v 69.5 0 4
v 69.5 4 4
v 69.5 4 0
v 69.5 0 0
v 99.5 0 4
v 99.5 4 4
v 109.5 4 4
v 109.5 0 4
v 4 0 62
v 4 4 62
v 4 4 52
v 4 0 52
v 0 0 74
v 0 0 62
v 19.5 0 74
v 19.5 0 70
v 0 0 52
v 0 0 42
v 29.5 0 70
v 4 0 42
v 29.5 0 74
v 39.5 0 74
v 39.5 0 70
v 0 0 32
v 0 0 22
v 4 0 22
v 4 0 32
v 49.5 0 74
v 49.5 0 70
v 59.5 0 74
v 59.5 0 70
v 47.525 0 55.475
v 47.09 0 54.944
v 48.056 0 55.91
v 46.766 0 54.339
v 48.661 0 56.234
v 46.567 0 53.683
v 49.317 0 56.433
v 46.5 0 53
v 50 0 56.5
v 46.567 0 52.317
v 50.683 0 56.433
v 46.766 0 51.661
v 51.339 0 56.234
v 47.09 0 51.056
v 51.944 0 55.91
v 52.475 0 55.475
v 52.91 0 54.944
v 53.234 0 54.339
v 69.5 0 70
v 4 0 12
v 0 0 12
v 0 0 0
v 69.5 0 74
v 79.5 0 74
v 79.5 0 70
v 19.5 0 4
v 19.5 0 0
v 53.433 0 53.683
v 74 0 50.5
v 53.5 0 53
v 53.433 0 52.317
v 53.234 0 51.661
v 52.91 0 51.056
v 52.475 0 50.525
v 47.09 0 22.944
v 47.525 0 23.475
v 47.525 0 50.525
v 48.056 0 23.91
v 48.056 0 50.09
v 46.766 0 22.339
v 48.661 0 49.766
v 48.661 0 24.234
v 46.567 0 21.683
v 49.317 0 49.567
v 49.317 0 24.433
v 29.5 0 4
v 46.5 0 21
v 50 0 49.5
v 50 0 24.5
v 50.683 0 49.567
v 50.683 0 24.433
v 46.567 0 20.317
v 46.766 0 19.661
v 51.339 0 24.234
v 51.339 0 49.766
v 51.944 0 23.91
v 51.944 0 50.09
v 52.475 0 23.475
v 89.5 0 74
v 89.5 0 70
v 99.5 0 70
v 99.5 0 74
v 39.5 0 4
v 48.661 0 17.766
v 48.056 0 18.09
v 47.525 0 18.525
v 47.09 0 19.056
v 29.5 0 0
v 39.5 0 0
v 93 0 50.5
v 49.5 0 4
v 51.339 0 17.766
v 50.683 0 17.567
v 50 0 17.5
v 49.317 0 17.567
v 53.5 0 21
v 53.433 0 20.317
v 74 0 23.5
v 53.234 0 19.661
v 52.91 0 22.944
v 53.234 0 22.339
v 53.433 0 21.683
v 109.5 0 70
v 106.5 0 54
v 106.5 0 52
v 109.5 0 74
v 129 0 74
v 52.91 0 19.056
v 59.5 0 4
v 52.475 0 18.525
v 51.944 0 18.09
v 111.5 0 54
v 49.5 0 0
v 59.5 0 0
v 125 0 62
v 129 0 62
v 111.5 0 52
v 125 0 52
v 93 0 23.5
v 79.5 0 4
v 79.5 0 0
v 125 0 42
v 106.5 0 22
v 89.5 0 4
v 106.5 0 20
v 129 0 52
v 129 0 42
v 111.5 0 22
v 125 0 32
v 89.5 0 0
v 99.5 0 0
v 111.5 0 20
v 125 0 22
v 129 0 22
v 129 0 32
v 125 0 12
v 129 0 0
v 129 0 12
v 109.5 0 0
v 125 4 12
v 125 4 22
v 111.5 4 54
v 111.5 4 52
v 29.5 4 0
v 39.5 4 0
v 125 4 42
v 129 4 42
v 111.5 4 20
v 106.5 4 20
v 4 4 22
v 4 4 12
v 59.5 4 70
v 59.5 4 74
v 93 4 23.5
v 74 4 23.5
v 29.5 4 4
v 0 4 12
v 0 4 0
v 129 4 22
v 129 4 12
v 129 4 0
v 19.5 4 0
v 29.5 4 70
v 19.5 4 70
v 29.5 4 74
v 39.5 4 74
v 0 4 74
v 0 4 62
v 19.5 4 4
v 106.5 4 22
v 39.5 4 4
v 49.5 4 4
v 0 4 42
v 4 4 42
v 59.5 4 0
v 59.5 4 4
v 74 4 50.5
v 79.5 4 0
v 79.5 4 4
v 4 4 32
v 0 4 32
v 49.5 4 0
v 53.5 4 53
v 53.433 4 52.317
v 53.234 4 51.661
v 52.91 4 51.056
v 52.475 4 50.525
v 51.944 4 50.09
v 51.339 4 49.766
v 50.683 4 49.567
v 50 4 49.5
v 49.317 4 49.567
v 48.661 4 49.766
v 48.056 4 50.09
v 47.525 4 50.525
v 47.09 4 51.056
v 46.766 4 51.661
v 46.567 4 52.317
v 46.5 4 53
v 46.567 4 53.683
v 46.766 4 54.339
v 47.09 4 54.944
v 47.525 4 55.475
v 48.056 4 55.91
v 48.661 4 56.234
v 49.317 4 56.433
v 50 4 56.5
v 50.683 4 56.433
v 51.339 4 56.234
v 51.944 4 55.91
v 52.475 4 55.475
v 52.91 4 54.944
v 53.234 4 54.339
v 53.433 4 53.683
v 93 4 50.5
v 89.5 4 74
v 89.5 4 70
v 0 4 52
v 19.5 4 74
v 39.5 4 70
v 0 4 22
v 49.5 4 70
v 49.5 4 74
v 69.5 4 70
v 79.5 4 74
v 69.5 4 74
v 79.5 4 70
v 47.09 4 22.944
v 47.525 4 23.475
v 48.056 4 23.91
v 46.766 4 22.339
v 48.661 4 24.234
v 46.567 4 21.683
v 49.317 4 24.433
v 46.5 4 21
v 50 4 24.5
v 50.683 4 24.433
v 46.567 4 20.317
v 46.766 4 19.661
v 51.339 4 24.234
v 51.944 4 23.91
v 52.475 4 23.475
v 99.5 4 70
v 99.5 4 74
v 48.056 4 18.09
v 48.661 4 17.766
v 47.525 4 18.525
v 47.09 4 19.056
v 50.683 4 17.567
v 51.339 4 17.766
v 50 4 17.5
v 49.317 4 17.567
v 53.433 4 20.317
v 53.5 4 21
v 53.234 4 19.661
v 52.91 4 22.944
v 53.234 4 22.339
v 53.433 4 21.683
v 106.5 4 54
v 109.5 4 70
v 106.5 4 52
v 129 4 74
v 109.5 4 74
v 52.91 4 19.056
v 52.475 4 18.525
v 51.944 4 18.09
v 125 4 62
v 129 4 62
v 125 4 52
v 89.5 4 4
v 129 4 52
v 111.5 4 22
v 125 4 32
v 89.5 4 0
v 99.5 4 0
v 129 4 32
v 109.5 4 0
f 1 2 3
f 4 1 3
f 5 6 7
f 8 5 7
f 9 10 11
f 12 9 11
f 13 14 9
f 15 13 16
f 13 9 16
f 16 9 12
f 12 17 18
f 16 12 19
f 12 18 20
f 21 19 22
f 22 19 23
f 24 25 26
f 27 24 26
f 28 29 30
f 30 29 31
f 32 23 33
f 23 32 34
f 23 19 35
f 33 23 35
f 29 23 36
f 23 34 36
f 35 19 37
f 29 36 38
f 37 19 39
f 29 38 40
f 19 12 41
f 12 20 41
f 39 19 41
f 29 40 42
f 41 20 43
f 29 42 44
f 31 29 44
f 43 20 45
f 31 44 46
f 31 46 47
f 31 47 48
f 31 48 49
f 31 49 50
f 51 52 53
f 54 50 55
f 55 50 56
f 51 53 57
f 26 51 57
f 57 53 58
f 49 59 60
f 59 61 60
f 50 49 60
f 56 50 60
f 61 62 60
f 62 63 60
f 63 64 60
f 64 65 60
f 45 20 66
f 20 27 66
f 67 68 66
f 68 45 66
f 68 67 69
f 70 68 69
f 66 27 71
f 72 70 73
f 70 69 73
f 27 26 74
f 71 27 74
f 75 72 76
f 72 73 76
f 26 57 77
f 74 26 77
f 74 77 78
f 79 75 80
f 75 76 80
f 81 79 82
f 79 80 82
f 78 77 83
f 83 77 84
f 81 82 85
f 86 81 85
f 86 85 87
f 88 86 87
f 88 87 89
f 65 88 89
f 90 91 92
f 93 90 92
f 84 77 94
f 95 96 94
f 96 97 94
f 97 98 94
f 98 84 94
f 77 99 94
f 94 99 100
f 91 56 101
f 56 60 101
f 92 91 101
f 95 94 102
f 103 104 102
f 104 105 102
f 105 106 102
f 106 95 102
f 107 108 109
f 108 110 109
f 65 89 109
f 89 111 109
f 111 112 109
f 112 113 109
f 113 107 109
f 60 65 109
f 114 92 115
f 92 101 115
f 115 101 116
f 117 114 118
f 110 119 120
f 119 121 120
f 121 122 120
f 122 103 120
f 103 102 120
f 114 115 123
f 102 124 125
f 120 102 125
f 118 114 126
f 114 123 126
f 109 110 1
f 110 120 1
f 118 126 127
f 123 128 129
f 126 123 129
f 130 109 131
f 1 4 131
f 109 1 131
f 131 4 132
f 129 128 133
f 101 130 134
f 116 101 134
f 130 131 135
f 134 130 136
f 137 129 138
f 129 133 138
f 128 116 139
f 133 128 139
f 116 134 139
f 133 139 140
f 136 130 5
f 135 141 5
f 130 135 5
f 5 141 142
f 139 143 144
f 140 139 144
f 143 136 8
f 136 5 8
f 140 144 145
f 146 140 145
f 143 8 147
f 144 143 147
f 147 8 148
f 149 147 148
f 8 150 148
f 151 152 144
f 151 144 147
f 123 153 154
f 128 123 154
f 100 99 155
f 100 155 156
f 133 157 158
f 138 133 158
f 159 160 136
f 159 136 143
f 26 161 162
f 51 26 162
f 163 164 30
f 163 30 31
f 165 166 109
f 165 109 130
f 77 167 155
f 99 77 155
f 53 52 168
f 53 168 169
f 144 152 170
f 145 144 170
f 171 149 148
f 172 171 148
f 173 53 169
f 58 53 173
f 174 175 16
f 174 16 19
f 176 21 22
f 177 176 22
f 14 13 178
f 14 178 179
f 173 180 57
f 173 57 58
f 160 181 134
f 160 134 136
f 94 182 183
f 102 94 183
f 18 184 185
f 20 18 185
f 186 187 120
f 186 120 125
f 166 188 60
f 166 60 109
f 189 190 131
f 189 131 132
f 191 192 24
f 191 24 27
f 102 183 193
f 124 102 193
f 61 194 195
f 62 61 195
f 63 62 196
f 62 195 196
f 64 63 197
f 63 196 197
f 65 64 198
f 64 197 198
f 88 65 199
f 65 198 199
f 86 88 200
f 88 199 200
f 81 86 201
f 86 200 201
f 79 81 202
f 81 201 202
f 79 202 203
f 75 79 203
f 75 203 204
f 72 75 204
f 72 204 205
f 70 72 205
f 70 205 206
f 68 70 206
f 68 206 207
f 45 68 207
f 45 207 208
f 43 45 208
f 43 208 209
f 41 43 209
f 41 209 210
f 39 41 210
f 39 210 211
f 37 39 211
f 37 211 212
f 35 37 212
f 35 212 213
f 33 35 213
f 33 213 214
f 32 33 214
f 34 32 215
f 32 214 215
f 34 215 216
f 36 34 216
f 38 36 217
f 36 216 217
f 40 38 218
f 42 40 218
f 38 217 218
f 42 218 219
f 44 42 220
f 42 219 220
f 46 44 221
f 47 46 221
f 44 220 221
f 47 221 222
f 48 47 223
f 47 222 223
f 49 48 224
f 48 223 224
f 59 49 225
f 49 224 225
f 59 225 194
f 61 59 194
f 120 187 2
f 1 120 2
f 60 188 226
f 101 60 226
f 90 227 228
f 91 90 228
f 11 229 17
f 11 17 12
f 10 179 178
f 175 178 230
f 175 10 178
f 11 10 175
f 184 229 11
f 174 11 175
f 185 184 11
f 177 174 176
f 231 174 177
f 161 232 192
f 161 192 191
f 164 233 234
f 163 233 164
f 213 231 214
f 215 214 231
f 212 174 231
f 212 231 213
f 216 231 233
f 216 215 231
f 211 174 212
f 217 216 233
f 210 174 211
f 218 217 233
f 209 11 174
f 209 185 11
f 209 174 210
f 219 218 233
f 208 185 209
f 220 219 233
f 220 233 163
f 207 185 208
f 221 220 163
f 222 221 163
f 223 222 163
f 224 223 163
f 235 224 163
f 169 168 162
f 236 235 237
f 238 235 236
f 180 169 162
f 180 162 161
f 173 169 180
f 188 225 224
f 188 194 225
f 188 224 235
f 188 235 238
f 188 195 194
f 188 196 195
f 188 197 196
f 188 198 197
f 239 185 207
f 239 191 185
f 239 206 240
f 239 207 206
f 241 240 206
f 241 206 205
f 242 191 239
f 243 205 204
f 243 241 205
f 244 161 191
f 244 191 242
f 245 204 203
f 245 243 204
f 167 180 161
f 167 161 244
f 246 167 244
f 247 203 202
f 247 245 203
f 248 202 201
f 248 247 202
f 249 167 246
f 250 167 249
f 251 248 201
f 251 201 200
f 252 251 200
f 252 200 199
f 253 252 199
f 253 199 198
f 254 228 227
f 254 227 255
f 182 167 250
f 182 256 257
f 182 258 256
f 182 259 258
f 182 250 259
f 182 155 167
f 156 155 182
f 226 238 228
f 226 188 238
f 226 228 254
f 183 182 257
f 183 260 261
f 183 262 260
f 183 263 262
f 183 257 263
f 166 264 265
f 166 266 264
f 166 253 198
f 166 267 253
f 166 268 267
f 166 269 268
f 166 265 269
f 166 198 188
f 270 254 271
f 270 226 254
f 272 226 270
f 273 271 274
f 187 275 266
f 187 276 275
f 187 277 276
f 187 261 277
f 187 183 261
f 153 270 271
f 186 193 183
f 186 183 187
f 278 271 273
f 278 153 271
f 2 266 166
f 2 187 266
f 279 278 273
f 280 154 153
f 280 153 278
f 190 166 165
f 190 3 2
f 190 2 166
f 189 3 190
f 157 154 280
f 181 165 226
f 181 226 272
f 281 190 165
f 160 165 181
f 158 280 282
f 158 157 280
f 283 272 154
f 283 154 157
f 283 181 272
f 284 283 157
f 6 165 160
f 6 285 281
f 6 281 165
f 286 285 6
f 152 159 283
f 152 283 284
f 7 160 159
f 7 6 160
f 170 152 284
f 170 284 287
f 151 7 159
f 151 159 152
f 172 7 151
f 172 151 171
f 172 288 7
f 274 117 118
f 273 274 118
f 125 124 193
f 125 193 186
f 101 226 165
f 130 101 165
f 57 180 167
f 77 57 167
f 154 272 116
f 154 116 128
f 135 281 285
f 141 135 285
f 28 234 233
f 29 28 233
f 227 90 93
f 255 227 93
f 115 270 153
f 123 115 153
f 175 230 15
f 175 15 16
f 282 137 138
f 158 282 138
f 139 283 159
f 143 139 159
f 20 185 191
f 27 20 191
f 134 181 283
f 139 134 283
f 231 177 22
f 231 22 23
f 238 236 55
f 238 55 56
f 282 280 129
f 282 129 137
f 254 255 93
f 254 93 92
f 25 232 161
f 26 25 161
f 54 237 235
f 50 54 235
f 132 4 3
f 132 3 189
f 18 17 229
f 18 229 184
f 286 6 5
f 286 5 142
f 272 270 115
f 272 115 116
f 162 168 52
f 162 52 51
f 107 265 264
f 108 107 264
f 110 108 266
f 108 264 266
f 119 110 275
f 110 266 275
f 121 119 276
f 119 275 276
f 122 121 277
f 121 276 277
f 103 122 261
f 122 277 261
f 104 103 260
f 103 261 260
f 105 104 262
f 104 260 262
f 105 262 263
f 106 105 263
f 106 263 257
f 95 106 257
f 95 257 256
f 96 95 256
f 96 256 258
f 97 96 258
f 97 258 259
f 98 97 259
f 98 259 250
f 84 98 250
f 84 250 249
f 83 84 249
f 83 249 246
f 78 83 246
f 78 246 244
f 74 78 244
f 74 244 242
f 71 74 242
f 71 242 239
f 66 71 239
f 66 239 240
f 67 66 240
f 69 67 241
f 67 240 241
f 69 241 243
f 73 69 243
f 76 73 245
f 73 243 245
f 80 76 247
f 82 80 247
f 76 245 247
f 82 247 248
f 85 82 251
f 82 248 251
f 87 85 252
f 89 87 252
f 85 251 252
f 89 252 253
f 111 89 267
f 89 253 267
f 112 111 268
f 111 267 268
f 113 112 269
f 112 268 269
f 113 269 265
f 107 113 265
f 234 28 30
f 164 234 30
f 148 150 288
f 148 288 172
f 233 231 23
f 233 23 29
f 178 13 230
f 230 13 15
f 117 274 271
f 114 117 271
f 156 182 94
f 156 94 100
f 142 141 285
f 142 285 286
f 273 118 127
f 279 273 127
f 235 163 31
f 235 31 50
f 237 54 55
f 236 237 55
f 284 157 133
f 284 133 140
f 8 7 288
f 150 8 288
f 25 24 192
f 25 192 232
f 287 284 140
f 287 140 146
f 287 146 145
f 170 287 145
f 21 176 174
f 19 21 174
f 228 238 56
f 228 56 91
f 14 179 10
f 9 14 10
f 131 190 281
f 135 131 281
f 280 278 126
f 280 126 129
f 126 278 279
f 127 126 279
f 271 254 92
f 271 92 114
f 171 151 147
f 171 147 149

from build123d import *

# Parameters (mm, degrees)
SKETCH1_W           = 129
SKETCH1_H           = 74
BOSS_EXTRUDE1_DEPTH = 4
SKETCH2_R           = 3.5
SKETCH2_W           = 19
SKETCH2_H           = 27
CUT_EXTRUDE1_DEPTH  = 5
SKETCH3_W           = 5
SKETCH3_H           = 2
CUT_EXTRUDE2_DEPTH  = 5
SKETCH4_W           = 4
SKETCH4_H           = 10
SKETCH4_W_2         = 10
SKETCH4_H_2         = 4
CUT_EXTRUDE3_DEPTH  = 5


with BuildPart() as part:
    # Sketch1 → Boss-Extrude1 (new body)
    with BuildSketch(Plane(origin=(0, 0, 0), x_dir=(1, 0, 0), z_dir=(0, 1, 0))):
        with Locations((64.5, -37)):
            Rectangle(SKETCH1_W, SKETCH1_H)
    extrude(amount=BOSS_EXTRUDE1_DEPTH)

    # Sketch2 → Cut-Extrude1 (cut, through all)
    with BuildSketch(Plane(origin=(0, 4, 0), x_dir=(1, 0, 0), z_dir=(0, 1, 0))):
        with Locations((50, -21)):
            Circle(SKETCH2_R)
        with Locations((50, -53)):
            Circle(SKETCH2_R)
        with Locations((83.5, -37)):
            Rectangle(SKETCH2_W, SKETCH2_H)
    extrude(amount=-CUT_EXTRUDE1_DEPTH, mode=Mode.SUBTRACT)

    # Sketch3 → Cut-Extrude2 (cut, through all)
    with BuildSketch(Plane(origin=(0, 4, 0), x_dir=(1, 0, 0), z_dir=(0, 1, 0))):
        with Locations((109, -21)):
            Rectangle(SKETCH3_W, SKETCH3_H)
        with Locations((109, -53)):
            Rectangle(SKETCH3_W, SKETCH3_H)
    extrude(amount=-CUT_EXTRUDE2_DEPTH, mode=Mode.SUBTRACT)

    # Sketch4 → Cut-Extrude3 (cut, through all)
    with BuildSketch(Plane(origin=(0, 4, 0), x_dir=(1, 0, 0), z_dir=(0, 1, 0))):
        with Locations((127, -57)):
            Rectangle(SKETCH4_W, SKETCH4_H)
        with Locations((127, -37)):
            Rectangle(SKETCH4_W, SKETCH4_H)
        with Locations((127, -17)):
            Rectangle(SKETCH4_W, SKETCH4_H)
        with Locations((2, -57)):
            Rectangle(SKETCH4_W, SKETCH4_H)
        with Locations((2, -37)):
            Rectangle(SKETCH4_W, SKETCH4_H)
        with Locations((2, -17)):
            Rectangle(SKETCH4_W, SKETCH4_H)
        with Locations((104.5, -2)):
            Rectangle(SKETCH4_W_2, SKETCH4_H_2)
        with Locations((84.5, -2)):
            Rectangle(SKETCH4_W_2, SKETCH4_H_2)
        with Locations((64.5, -2)):
            Rectangle(SKETCH4_W_2, SKETCH4_H_2)
        with Locations((44.5, -2)):
            Rectangle(SKETCH4_W_2, SKETCH4_H_2)
        with Locations((24.5, -2)):
            Rectangle(SKETCH4_W_2, SKETCH4_H_2)
        with Locations((104.5, -72)):
            Rectangle(SKETCH4_W_2, SKETCH4_H_2)
        with Locations((84.5, -72)):
            Rectangle(SKETCH4_W_2, SKETCH4_H_2)
        with Locations((64.5, -72)):
            Rectangle(SKETCH4_W_2, SKETCH4_H_2)
        with Locations((44.5, -72)):
            Rectangle(SKETCH4_W_2, SKETCH4_H_2)
        with Locations((24.5, -72)):
            Rectangle(SKETCH4_W_2, SKETCH4_H_2)
    extrude(amount=-CUT_EXTRUDE3_DEPTH, mode=Mode.SUBTRACT)


solid = part.part
